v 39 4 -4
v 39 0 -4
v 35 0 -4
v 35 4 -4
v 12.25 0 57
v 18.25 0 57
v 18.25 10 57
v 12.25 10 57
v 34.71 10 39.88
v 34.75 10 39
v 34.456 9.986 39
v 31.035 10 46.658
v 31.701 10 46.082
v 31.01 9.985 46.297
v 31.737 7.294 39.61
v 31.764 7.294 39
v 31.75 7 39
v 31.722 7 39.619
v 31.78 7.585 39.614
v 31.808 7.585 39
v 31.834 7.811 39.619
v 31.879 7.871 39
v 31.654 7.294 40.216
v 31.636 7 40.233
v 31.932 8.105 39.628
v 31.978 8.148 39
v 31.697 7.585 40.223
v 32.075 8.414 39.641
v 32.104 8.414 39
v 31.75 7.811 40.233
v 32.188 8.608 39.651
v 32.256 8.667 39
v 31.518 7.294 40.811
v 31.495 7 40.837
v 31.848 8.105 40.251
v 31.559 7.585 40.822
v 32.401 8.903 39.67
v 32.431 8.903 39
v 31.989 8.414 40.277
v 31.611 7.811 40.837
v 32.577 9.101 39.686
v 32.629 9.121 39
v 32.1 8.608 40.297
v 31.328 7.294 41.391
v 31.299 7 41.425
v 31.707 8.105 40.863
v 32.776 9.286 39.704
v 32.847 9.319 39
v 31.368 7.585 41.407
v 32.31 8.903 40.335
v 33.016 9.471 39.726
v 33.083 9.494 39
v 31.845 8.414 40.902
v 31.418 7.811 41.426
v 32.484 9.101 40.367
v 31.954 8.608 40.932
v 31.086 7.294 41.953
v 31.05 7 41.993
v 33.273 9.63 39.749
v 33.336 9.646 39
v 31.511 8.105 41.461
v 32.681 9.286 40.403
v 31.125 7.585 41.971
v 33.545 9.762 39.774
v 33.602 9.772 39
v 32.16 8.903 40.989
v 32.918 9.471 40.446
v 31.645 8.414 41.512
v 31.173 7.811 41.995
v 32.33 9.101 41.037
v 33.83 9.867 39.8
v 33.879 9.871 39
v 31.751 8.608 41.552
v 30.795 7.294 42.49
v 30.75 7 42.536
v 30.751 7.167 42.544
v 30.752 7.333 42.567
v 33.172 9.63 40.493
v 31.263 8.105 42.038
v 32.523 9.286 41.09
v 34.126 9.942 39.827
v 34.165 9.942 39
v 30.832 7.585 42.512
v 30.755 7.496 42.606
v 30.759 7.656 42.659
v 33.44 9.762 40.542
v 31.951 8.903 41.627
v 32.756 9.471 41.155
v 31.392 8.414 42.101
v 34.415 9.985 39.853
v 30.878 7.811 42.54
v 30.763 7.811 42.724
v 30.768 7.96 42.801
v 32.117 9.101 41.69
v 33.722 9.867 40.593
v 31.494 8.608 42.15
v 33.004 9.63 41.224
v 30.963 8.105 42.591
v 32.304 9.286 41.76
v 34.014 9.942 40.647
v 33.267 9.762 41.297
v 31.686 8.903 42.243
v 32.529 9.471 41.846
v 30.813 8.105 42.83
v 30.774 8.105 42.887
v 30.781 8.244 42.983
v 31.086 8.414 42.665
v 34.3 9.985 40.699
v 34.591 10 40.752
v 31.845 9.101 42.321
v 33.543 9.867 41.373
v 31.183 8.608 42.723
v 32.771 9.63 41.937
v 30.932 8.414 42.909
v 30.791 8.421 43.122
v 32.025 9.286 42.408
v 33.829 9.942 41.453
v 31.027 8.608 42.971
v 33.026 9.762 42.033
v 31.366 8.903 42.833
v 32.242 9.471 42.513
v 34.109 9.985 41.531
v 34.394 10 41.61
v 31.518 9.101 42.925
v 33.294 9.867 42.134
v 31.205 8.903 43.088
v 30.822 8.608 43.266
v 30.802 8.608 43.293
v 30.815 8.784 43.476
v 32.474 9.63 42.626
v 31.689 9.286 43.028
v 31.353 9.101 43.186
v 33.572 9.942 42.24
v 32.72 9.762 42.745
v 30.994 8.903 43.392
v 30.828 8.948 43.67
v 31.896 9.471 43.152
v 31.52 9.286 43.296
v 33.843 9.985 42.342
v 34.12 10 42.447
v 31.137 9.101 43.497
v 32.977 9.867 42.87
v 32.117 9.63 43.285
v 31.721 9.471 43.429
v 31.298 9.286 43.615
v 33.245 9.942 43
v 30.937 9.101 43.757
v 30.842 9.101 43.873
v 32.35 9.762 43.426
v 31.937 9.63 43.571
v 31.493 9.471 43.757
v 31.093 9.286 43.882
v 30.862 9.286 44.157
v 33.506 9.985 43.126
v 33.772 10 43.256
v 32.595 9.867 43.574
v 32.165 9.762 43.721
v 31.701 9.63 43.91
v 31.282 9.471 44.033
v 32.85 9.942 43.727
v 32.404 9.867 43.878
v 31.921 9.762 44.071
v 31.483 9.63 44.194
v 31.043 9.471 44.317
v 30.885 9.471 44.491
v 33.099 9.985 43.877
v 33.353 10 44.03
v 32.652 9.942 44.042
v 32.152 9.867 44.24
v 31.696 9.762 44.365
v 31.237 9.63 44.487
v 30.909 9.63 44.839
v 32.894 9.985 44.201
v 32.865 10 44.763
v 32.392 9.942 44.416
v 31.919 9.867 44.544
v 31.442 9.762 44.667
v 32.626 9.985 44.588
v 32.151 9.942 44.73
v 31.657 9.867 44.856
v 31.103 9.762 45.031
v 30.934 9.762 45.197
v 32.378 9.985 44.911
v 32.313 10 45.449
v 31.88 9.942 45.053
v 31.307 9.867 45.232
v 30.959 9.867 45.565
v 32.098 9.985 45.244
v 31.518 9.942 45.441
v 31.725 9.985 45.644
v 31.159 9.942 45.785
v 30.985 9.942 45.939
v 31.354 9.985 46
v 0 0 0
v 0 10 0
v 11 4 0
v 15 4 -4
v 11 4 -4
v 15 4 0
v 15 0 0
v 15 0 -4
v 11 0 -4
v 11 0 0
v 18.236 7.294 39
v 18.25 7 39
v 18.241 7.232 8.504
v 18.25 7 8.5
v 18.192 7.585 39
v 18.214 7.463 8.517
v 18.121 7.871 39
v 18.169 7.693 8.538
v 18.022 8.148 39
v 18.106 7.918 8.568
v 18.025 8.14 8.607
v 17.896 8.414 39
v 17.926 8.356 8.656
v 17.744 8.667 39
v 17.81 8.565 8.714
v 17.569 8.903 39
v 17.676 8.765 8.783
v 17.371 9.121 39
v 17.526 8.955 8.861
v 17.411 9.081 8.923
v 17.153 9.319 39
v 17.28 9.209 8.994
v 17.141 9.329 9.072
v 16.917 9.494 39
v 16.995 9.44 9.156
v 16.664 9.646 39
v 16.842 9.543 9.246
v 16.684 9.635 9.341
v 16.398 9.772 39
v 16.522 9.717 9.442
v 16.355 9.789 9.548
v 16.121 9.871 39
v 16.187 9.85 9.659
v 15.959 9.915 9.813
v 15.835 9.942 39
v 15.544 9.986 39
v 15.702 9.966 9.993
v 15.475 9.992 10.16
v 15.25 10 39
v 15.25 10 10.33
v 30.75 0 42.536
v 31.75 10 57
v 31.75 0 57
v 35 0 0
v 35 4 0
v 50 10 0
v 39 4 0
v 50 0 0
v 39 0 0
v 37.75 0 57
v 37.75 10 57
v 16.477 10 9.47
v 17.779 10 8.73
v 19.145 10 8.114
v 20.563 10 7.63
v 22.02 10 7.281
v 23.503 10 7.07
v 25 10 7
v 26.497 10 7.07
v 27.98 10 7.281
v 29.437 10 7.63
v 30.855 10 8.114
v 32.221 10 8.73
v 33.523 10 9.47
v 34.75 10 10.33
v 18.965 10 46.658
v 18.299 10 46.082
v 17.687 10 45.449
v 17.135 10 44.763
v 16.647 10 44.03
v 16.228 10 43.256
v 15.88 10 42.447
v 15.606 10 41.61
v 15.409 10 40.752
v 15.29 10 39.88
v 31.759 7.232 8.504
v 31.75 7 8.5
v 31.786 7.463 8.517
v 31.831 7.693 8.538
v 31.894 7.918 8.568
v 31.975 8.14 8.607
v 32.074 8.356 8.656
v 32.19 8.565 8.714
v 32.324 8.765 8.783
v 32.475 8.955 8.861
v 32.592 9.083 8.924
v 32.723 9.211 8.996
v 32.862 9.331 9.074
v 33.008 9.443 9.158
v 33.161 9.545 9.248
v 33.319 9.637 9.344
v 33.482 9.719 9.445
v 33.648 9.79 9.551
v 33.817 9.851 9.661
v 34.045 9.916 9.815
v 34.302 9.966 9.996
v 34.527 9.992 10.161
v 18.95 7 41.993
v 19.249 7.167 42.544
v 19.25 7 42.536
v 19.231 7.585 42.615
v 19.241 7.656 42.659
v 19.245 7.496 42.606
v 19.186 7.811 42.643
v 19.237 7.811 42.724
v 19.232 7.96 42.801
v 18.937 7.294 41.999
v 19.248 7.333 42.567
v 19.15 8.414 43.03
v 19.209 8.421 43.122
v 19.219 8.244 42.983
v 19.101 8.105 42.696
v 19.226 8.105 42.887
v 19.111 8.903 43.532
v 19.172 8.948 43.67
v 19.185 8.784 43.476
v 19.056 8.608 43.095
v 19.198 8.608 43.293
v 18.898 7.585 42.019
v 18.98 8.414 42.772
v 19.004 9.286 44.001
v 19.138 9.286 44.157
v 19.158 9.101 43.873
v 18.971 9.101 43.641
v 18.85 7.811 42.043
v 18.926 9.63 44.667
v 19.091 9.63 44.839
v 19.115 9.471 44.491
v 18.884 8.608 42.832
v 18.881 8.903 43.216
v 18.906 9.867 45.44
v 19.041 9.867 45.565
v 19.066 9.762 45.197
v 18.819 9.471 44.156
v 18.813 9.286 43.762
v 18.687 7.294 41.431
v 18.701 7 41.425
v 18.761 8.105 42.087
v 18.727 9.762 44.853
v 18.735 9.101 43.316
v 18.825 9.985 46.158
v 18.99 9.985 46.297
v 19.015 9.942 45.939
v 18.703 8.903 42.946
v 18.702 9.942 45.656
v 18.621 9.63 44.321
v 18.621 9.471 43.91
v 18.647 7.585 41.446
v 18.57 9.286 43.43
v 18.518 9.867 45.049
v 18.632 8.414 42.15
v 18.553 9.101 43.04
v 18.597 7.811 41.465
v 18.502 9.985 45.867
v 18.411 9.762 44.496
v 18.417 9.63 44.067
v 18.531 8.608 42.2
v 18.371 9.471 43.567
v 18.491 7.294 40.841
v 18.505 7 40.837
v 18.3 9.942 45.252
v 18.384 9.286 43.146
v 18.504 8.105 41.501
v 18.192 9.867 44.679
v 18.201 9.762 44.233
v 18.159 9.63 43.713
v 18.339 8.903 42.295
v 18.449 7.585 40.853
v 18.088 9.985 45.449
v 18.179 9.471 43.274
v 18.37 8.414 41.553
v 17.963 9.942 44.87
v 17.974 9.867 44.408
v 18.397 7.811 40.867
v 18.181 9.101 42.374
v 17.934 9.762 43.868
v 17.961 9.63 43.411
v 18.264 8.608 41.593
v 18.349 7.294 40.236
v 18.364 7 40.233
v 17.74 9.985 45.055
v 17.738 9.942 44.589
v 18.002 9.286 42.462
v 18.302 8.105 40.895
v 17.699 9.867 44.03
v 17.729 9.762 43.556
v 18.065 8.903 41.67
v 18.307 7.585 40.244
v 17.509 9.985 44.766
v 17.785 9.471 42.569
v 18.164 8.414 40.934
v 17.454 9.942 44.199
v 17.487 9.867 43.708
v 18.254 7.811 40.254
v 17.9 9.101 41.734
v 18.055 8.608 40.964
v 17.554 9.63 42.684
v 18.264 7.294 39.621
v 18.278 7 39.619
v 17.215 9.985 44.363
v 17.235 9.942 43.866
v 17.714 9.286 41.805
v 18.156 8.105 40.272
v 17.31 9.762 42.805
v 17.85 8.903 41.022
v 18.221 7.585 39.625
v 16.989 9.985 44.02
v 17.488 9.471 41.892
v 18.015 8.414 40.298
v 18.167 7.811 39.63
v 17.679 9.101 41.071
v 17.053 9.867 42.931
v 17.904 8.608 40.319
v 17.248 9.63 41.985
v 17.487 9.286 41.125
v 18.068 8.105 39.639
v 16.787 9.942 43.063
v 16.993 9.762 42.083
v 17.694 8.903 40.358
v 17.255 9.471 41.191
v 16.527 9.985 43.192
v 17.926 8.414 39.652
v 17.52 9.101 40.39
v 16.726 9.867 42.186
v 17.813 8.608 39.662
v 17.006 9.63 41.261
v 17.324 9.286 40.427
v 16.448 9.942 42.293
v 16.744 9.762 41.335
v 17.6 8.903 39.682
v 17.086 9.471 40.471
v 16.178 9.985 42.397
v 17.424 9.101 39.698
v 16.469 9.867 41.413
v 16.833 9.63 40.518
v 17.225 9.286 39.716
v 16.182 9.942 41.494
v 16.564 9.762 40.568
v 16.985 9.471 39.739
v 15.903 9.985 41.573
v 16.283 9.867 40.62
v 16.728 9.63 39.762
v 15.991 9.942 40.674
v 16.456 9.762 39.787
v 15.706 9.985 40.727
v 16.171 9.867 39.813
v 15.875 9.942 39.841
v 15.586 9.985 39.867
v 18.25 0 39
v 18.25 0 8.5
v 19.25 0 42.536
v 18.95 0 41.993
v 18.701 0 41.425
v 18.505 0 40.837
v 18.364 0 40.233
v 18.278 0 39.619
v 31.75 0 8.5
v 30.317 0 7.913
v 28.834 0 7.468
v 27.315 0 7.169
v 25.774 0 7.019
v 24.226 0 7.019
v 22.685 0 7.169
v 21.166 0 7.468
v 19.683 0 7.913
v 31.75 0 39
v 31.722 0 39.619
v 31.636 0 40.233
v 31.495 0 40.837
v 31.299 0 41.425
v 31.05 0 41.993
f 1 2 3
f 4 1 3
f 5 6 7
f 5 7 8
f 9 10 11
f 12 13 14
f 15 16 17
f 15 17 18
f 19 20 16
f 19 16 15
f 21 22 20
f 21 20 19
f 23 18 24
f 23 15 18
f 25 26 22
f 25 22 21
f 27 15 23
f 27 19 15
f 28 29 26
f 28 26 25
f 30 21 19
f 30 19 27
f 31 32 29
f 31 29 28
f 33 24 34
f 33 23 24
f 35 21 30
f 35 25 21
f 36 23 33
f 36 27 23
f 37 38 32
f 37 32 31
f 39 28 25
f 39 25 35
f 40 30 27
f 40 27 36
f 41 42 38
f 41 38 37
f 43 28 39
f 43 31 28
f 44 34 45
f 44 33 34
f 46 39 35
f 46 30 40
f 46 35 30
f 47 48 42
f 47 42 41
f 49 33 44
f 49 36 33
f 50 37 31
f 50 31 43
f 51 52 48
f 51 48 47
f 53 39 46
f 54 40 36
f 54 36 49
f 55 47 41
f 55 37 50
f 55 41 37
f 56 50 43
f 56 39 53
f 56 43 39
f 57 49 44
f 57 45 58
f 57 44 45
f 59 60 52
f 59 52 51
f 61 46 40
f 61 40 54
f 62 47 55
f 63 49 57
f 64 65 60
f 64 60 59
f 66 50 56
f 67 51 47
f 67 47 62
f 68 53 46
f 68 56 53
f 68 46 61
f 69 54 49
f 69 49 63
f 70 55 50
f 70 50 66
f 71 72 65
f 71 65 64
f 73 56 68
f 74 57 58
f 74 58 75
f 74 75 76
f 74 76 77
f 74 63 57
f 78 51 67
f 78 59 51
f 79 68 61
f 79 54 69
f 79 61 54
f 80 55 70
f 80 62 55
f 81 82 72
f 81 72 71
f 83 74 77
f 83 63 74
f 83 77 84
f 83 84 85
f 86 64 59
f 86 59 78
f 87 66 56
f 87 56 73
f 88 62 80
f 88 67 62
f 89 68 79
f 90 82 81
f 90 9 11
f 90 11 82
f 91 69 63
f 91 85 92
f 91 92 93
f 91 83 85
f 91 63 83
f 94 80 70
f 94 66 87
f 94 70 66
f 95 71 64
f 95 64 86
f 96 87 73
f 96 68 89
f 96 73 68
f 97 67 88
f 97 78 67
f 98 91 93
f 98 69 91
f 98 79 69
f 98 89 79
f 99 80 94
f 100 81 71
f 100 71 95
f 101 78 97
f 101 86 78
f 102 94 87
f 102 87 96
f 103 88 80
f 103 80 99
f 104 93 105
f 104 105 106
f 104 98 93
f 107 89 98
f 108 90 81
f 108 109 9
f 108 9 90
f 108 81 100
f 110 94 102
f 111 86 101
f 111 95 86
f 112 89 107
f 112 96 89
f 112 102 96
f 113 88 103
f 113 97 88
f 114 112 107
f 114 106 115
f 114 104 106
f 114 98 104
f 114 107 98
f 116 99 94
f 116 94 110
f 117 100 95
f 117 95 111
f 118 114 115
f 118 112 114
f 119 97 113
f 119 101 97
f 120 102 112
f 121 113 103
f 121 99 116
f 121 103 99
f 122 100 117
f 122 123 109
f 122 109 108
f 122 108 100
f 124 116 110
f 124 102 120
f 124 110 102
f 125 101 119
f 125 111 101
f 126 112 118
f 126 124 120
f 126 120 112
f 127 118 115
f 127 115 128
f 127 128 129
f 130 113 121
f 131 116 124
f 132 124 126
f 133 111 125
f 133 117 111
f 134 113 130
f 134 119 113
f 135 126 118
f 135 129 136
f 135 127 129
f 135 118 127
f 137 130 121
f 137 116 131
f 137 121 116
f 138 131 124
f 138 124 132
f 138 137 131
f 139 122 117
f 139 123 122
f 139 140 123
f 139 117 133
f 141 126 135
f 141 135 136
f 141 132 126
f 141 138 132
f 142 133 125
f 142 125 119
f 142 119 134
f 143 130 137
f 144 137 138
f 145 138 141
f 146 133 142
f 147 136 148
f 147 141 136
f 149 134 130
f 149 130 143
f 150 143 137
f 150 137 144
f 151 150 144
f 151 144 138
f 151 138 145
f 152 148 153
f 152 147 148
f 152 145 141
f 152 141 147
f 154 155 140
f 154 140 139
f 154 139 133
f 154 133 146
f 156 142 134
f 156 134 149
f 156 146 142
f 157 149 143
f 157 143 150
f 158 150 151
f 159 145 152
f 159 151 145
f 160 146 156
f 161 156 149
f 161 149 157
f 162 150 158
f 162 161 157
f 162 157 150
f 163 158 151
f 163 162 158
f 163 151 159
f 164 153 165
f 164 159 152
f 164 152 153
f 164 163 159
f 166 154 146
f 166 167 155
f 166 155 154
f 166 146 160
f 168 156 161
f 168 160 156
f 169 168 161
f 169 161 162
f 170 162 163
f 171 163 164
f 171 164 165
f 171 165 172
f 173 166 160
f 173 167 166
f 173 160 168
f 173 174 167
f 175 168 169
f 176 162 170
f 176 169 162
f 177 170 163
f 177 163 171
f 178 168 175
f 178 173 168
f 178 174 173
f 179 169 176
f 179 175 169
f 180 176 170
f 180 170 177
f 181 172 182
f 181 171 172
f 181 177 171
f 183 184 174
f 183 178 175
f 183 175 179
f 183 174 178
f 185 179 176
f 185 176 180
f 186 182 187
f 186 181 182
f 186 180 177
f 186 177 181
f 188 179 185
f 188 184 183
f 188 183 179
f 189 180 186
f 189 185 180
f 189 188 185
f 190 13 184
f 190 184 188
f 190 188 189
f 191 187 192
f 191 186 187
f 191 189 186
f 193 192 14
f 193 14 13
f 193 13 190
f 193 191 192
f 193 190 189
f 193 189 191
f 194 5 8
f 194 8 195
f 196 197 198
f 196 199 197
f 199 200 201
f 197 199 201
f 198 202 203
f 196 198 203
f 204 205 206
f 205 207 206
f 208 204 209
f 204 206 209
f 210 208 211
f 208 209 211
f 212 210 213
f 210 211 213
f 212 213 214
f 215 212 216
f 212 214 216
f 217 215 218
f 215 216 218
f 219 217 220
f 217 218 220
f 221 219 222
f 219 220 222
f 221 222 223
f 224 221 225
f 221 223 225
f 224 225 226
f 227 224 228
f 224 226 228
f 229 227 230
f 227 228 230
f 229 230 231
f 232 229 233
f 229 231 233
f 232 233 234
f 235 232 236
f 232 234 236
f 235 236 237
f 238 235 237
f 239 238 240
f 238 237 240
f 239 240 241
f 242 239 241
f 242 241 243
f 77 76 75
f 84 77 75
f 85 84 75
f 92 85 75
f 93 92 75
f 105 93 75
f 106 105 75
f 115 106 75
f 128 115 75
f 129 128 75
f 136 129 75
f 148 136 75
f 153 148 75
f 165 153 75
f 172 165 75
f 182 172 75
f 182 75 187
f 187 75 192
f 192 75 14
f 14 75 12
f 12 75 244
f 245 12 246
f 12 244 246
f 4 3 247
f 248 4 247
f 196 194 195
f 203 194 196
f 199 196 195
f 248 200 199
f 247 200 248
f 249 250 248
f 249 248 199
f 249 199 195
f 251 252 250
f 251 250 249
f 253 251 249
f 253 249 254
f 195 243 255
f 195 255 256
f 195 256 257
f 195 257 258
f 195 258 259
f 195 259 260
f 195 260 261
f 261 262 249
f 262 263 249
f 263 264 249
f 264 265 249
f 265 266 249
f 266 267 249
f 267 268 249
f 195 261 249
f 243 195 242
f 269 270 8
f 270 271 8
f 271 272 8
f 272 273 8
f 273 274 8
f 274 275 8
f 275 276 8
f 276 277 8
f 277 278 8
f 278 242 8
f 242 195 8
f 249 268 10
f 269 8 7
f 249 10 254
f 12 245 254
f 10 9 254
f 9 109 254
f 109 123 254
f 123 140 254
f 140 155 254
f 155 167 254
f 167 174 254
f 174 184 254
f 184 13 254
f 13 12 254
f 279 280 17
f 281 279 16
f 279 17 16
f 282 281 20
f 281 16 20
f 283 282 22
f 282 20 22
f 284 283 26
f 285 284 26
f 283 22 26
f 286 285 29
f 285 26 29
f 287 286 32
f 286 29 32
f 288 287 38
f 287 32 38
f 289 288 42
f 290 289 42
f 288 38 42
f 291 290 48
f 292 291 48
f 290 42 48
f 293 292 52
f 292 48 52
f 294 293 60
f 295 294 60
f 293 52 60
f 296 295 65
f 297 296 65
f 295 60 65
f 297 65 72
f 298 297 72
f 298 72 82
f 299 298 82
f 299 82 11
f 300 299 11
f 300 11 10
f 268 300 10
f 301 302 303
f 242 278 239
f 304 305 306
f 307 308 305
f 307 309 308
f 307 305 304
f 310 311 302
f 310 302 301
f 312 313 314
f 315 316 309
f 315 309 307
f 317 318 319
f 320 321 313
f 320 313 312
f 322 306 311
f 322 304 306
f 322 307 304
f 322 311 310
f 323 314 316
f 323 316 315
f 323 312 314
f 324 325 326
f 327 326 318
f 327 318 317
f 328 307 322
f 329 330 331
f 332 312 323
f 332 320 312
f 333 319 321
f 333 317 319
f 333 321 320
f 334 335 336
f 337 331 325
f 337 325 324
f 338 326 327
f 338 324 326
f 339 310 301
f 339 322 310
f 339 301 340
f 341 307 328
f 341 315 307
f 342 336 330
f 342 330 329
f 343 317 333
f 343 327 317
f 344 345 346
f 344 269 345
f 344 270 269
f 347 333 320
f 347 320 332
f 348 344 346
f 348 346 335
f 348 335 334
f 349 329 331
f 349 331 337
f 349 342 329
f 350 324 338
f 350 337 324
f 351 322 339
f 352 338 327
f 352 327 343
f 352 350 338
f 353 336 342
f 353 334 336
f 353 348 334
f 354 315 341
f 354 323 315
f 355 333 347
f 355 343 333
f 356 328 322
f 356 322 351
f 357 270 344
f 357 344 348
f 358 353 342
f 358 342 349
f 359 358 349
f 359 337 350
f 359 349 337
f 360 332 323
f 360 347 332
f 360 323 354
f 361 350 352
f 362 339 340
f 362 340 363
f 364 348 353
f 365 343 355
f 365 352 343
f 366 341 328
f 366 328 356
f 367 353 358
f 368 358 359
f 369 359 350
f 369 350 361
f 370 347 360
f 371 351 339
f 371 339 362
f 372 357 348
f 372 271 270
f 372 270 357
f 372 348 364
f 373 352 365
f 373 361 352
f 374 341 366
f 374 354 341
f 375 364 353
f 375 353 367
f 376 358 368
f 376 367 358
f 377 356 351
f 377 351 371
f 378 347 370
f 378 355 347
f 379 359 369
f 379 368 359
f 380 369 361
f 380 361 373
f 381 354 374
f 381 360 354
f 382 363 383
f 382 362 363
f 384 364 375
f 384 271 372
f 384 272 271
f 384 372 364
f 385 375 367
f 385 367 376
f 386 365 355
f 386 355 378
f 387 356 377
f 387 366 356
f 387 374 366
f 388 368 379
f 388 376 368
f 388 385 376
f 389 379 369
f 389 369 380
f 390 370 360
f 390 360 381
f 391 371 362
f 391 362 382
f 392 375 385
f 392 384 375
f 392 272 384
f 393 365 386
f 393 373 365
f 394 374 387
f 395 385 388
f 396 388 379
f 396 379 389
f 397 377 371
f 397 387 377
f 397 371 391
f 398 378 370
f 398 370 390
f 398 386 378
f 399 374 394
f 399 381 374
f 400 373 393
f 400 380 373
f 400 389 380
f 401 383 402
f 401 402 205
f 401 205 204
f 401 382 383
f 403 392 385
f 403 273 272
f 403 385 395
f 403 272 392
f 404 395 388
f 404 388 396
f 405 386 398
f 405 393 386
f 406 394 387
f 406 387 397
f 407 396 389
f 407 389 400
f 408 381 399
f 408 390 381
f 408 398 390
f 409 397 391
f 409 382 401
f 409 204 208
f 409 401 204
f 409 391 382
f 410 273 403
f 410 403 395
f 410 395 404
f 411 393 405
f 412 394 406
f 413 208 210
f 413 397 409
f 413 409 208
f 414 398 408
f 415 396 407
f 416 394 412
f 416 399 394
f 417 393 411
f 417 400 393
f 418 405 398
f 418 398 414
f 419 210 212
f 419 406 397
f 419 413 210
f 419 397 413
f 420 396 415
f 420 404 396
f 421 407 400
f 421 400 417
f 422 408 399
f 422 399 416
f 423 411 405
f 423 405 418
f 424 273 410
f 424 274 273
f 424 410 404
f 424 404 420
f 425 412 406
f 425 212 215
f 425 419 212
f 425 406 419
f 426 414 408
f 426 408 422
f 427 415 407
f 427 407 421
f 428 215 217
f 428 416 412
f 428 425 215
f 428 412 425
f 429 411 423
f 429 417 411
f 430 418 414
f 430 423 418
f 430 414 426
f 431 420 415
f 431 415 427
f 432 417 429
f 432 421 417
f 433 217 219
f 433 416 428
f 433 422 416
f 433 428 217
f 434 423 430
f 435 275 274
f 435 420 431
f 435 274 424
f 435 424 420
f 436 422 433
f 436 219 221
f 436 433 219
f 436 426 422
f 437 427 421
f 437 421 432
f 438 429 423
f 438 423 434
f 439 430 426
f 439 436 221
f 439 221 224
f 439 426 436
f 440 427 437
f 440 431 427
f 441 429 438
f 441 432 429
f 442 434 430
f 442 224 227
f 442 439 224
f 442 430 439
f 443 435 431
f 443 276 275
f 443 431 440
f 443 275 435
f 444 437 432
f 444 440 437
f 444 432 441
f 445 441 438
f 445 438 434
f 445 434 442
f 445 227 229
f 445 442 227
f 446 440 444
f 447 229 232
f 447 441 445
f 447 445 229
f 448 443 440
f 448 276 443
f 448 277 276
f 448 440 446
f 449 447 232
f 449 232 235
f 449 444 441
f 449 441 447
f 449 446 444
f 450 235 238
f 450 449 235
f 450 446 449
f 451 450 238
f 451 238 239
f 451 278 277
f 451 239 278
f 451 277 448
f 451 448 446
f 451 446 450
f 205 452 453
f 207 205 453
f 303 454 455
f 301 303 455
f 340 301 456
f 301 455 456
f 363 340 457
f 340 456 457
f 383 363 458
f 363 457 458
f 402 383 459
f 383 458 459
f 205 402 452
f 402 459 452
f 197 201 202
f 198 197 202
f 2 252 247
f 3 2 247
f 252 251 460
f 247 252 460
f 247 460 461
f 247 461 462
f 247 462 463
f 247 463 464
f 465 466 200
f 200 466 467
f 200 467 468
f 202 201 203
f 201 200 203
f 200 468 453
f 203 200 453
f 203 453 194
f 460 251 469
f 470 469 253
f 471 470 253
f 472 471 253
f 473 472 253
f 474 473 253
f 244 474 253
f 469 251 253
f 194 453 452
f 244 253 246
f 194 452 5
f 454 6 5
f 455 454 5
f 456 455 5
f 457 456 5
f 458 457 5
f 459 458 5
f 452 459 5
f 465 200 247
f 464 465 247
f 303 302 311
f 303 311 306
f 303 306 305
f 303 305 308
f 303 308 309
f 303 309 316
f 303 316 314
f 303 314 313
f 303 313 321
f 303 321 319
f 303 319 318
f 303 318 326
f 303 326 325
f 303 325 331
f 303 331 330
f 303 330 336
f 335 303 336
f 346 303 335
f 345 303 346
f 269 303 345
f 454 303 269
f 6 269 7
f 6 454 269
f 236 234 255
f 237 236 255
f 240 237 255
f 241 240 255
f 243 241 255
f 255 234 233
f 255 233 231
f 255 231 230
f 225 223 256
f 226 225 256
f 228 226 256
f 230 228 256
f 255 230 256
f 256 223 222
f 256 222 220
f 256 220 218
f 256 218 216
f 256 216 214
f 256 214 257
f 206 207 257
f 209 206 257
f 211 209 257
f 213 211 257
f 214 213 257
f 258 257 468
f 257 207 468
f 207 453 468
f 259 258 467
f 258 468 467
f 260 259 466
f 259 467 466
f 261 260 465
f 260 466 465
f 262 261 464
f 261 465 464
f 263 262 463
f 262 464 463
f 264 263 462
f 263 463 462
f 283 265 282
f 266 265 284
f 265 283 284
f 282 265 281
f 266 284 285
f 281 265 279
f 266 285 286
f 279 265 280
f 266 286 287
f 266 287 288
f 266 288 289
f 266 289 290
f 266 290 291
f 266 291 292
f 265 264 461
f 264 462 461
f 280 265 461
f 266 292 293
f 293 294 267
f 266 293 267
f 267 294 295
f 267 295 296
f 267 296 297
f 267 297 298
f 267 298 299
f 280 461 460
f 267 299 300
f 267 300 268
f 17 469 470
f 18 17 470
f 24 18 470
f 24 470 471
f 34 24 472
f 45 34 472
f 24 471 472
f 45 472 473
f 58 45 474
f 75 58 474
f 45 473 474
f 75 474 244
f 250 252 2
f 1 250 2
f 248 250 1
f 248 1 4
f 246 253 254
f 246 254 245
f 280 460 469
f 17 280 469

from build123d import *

# Parameters (mm, degrees)
PAD006_DEPTH = 10
FILLET001_R  = 3
PAD010_DEPTH = 4


with BuildPart() as part:
    # Sketch006 → Pad006 (new body)
    with BuildSketch(Plane.XZ):
        with BuildLine():
            Line((18.25, 57), (12.25, 57))
            Line((12.25, 57), (0, 0))
            Line((0, 0), (50, 0))
            Line((50, 0), (37.75, 57))
            Line((37.75, 57), (31.75, 57))
            Line((30.75, 42.535534), (31.75, 57))
            ThreePointArc((31.75, 39), (31.495191, 40.837117), (30.75, 42.535534))
            Line((31.75, 8.5), (31.75, 39))
            ThreePointArc((18.25, 8.5), (25, 7), (31.75, 8.5))
            Line((18.25, 39), (18.25, 8.5))
            ThreePointArc((19.25, 42.535534), (18.504809, 40.837117), (18.25, 39))
            Line((19.25, 42.535534), (18.25, 57))
        make_face()
    extrude(amount=-PAD006_DEPTH)

    # Fillet001
    fillet001_edges = [part.edges().sort_by_distance(p)[0] for p in [
        (31.75, 10, 23.75),
        (18.25, 10, 23.75),
    ]]
    fillet(fillet001_edges, radius=FILLET001_R)

    # Sketch009 → Pad010 (join)
    with BuildSketch(Plane.XZ):
        Polygon((11, -4), (11, 5.262975), (39, 5.262975), (39, -4), (35, -4), (35, 0), (15, 0), (15, -4), align=None)
    extrude(amount=-PAD010_DEPTH)


solid = part.part
